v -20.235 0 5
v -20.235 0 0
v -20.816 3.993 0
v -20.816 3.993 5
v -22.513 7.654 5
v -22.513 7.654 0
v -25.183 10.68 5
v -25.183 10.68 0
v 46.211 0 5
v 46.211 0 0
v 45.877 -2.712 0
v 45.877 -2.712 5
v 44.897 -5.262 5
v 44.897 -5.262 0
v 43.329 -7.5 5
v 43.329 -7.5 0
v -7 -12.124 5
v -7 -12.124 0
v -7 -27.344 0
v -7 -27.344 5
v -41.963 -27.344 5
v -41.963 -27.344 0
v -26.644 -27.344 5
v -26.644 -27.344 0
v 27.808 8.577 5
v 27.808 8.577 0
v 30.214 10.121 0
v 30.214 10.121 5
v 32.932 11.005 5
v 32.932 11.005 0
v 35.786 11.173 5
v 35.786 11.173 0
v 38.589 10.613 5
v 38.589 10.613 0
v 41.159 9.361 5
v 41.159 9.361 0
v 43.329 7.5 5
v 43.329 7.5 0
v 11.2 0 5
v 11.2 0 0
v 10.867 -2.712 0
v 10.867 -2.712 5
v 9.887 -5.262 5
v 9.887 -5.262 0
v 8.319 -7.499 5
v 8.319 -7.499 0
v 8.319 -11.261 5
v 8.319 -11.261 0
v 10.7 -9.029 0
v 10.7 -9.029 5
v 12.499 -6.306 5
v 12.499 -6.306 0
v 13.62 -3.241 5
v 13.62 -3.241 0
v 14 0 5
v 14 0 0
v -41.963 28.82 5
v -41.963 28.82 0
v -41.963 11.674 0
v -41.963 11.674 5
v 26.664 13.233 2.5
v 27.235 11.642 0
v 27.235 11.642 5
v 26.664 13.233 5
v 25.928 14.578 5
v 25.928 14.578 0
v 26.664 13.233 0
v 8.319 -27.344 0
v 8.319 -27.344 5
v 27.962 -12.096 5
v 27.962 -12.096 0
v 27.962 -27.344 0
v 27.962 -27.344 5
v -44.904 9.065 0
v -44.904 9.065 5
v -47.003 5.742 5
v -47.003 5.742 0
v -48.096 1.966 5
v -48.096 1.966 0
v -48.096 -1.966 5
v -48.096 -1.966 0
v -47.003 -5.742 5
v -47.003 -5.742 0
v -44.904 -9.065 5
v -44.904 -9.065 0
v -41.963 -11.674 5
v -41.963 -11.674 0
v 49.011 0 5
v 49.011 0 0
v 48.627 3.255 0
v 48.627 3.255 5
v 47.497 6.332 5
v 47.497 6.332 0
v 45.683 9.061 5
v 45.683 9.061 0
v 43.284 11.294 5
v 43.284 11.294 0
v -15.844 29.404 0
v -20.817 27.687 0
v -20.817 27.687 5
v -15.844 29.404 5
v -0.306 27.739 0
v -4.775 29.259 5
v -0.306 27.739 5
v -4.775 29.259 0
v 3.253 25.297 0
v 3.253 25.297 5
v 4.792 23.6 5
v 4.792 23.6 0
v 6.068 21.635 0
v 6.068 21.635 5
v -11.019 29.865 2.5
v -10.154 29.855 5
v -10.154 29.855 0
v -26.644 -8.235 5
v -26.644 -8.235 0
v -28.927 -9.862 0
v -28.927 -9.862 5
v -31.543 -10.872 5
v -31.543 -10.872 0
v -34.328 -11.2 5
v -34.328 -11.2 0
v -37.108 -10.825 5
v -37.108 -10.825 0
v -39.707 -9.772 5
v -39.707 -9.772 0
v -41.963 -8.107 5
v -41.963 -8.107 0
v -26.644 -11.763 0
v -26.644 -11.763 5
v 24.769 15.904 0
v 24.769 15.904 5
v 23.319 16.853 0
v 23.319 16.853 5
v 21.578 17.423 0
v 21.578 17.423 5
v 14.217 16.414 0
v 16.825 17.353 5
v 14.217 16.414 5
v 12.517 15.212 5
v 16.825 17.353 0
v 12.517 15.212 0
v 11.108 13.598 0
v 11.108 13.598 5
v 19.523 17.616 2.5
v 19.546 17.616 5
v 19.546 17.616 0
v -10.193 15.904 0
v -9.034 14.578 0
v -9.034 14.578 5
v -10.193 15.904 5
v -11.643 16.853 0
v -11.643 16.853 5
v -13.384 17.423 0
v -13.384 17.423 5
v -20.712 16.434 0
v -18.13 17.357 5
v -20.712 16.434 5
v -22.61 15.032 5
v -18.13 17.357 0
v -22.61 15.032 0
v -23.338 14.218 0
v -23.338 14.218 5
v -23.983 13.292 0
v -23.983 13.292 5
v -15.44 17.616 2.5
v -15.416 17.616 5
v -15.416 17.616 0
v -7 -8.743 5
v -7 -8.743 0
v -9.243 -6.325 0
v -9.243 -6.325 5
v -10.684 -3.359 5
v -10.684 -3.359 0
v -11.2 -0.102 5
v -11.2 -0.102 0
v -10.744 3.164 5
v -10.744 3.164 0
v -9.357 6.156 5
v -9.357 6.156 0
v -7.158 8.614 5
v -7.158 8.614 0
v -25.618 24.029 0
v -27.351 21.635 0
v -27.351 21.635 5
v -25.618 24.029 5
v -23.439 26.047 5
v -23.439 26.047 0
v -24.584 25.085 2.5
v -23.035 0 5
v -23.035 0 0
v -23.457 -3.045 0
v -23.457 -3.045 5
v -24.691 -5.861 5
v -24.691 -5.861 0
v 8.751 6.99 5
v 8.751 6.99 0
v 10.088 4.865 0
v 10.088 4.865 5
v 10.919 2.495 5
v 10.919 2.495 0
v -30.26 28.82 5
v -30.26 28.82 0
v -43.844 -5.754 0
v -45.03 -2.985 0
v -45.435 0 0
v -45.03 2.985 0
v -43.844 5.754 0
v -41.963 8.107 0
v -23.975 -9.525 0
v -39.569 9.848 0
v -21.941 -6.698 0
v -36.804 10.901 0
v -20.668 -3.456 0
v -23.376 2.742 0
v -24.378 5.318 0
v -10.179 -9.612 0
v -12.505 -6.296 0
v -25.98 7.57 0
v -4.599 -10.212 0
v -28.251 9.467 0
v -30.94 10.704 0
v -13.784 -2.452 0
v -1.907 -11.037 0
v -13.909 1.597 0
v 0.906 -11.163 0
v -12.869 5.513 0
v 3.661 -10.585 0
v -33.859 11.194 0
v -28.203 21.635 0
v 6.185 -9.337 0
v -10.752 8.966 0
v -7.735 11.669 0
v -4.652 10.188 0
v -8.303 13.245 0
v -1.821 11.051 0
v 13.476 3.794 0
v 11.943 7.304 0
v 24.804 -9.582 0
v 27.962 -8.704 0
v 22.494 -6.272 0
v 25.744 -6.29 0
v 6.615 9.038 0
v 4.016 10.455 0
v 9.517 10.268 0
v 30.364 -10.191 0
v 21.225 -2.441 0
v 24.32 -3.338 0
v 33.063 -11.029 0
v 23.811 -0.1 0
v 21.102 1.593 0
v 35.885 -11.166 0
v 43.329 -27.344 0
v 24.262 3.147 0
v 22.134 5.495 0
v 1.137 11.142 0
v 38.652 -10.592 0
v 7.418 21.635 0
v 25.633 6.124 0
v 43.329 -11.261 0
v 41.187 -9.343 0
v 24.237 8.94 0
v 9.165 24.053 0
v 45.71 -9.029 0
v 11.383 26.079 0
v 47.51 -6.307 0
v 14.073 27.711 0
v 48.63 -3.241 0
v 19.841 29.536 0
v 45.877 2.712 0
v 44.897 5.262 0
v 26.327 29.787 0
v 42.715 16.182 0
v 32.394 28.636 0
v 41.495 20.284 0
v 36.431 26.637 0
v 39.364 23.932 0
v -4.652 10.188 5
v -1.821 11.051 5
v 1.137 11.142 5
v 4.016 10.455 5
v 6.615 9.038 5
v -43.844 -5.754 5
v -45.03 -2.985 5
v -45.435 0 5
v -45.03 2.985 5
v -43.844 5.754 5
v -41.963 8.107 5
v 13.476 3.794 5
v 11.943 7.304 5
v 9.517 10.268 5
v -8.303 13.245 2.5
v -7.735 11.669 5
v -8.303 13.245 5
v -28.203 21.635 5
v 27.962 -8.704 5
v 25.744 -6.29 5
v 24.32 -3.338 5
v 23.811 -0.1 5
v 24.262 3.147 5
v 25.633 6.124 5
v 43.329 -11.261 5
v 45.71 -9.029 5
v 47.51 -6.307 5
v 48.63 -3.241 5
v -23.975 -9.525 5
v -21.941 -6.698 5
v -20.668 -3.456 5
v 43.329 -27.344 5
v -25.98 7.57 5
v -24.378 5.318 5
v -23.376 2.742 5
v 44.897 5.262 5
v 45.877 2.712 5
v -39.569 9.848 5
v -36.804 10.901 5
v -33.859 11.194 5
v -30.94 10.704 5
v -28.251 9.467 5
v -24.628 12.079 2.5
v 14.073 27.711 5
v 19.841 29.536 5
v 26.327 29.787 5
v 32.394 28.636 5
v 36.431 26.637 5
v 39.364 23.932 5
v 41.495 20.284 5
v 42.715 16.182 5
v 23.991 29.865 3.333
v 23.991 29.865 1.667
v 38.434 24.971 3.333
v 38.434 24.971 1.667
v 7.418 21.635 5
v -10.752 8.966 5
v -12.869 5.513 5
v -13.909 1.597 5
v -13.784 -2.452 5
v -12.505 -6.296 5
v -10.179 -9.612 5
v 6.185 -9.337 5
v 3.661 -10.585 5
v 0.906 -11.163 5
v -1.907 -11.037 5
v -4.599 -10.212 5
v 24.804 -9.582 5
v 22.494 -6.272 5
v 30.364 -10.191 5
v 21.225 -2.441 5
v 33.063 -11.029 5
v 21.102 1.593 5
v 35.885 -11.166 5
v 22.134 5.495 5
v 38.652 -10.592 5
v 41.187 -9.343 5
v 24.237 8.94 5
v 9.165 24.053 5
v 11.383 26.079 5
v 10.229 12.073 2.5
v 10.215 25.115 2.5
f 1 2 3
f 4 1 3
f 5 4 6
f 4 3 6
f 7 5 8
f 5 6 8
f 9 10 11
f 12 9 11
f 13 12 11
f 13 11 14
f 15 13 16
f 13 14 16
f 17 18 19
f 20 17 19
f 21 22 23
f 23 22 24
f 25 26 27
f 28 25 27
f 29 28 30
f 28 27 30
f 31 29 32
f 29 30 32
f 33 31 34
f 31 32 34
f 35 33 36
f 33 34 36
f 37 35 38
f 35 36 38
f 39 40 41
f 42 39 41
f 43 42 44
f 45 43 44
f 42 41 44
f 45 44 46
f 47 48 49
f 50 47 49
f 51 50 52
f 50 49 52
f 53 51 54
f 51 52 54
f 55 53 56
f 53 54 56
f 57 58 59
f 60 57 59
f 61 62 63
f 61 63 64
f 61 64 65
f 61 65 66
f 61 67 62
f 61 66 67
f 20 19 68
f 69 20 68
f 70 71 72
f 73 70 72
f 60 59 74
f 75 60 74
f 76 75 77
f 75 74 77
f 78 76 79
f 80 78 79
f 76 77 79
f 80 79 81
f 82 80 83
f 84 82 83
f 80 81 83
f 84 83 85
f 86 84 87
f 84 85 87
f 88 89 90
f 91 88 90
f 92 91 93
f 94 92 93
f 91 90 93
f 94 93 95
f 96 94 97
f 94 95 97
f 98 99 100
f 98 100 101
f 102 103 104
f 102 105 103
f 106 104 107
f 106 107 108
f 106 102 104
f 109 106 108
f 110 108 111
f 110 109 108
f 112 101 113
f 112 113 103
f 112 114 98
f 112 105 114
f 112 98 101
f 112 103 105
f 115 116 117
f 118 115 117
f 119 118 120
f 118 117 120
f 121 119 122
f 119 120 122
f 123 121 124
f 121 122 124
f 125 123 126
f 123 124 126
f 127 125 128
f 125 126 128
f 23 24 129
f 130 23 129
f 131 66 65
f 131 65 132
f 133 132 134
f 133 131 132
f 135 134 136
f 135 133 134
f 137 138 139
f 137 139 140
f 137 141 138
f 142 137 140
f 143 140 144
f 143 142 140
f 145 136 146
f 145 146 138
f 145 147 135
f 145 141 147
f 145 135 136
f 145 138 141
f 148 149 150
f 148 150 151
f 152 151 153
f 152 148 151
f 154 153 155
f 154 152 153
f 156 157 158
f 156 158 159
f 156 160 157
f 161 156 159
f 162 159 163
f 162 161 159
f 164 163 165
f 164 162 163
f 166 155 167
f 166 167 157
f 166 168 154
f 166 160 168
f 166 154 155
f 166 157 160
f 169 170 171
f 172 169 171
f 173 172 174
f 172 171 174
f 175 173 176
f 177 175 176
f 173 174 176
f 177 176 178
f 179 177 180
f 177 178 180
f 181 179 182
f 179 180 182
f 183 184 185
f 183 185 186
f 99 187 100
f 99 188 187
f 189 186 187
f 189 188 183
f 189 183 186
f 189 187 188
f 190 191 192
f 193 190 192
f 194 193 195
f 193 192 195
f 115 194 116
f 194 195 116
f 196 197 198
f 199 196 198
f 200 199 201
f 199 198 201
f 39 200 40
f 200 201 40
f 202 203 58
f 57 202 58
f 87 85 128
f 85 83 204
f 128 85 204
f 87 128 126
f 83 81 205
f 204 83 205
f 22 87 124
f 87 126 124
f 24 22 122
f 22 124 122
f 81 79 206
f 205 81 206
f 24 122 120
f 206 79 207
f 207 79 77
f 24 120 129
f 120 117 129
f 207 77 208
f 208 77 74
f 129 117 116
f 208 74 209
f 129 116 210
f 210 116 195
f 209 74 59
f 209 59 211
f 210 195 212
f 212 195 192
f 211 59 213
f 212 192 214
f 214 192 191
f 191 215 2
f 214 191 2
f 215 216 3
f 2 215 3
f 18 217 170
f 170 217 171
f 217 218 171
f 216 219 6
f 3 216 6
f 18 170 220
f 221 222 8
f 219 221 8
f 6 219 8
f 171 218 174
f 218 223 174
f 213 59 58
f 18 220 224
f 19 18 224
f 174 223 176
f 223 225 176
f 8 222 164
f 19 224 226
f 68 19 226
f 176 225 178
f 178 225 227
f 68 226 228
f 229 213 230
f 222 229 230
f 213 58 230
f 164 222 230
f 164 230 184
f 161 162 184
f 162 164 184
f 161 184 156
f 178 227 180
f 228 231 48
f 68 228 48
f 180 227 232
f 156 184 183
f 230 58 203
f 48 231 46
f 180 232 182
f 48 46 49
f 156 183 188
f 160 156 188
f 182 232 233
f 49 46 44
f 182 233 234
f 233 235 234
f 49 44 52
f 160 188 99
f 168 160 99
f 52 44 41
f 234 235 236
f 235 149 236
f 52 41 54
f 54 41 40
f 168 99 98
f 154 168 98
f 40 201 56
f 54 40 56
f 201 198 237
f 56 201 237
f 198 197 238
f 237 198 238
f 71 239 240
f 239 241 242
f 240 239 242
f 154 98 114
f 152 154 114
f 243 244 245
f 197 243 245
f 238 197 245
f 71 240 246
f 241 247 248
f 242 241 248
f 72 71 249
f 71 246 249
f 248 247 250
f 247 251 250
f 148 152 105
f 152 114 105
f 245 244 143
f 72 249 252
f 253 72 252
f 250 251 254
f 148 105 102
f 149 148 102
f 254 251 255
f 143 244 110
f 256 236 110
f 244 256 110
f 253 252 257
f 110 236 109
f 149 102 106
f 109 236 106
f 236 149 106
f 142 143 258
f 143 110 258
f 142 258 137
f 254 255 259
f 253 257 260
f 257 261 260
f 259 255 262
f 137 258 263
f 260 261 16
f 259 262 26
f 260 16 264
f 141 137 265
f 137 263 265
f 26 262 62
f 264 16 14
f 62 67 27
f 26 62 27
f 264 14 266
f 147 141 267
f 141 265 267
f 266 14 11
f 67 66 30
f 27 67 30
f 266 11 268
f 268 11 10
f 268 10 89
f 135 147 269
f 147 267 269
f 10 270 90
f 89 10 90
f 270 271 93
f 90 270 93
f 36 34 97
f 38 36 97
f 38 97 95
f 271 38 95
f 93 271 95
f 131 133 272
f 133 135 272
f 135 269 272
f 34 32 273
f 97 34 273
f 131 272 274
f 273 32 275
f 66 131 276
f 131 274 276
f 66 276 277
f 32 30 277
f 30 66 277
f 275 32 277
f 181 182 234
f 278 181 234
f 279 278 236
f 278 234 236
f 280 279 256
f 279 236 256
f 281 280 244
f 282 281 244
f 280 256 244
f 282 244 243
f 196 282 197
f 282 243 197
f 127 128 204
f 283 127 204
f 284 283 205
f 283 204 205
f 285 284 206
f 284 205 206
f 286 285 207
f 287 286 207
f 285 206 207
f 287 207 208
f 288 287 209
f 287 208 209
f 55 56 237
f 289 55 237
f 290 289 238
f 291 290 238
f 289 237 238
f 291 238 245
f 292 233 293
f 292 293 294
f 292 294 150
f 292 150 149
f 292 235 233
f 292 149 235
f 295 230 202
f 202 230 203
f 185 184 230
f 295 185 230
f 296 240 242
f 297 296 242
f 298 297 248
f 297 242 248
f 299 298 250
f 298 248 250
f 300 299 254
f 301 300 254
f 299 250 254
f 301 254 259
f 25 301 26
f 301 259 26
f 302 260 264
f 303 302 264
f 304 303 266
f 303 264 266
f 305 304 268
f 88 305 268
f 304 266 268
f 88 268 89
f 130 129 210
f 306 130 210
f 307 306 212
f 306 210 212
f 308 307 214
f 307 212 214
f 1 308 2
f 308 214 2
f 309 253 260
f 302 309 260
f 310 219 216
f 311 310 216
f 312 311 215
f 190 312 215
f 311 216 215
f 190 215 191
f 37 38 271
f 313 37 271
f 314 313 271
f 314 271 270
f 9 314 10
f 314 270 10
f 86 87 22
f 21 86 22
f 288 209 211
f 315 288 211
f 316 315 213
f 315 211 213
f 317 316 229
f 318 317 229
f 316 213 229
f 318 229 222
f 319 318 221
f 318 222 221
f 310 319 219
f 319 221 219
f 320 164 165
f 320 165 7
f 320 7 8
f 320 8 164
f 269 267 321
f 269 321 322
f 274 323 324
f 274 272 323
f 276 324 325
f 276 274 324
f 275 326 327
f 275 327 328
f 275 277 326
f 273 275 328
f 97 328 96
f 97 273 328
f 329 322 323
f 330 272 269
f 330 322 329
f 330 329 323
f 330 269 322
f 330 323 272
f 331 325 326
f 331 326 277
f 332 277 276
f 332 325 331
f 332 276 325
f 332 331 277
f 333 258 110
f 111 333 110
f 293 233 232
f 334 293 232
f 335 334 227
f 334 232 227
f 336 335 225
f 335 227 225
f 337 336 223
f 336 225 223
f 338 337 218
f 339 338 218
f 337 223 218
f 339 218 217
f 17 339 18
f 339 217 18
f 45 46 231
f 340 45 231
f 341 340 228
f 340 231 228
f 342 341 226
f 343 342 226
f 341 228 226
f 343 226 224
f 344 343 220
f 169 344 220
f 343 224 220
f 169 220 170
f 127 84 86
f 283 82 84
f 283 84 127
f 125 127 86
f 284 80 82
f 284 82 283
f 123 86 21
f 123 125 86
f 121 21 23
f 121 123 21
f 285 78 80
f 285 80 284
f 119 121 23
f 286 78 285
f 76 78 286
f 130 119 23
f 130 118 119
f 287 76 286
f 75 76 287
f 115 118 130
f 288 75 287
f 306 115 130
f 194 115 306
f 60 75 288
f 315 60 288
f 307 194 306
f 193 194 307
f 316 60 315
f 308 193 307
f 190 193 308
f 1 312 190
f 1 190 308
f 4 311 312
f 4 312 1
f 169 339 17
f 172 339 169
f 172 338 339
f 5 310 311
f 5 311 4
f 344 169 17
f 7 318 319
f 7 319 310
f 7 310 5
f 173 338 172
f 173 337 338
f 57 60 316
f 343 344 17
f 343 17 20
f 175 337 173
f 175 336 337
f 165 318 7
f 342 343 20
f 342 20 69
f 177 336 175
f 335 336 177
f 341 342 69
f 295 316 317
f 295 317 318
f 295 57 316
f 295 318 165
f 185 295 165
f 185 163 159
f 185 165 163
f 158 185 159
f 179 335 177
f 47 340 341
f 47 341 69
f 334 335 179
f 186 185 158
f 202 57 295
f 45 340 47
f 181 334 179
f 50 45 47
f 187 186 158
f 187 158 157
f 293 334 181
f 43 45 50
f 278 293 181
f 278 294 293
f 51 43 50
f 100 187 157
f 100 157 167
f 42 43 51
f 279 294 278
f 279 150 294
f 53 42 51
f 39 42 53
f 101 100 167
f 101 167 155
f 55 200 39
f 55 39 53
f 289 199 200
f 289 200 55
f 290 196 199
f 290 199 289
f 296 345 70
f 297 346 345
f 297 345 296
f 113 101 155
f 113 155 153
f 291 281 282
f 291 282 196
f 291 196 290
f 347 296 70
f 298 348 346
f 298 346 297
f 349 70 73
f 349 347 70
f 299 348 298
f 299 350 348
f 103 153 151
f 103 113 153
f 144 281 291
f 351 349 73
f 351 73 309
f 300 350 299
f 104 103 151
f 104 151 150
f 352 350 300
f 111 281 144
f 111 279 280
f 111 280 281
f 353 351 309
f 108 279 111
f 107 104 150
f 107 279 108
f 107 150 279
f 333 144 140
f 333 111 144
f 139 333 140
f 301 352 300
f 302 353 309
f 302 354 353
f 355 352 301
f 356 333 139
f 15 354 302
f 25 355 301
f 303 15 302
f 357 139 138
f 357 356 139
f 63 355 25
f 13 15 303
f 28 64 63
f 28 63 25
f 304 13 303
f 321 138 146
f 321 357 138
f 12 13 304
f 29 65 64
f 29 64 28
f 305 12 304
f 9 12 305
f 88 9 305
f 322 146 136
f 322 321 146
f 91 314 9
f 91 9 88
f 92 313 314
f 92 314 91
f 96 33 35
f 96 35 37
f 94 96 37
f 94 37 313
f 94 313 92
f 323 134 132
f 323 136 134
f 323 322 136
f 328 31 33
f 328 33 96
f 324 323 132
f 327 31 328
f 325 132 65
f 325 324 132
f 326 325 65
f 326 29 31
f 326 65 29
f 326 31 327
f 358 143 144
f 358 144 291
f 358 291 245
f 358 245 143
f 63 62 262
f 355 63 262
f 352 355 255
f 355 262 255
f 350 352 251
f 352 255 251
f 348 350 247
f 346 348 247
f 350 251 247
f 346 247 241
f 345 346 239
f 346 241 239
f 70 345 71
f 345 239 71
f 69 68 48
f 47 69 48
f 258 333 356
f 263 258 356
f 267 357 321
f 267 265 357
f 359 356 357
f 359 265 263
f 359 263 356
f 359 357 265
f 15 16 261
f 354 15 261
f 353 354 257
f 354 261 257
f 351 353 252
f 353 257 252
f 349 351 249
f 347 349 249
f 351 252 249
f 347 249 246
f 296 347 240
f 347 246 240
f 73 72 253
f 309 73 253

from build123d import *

# Parameters (mm, degrees)
F1_DEPTH = 5


with BuildPart() as f1:
    # F0 (on Top) → F1 (new body)
    with BuildSketch(Plane.XY):
        with BuildLine():
            ThreePointArc((-7.7347107175, 11.6693723103), (1.1336247824, 13.9540279078), (9.5168901863, 10.2678528029))
            add(Edge.make_bspline(
                [(11.1075389809, 13.5977625335), (10.1467025067, 12.2132719368), (9.5168901863, 10.2678528029)],
                knots=[0, 0, 0, 0.3445166401, 0.3445166401, 0.3445166401], degree=2))
            add(Edge.make_bspline(
                [(19.5225847934, 17.6164090534), (13.8964796656, 17.6164090534), (11.1075389809, 13.5977625335)],
                knots=[0, 0, 0, 1, 1, 1], degree=2))
            add(Edge.make_bspline(
                [(25.9283073461, 14.5783122844), (23.894872207, 17.6164090534), (19.5225847934, 17.6164090534)],
                knots=[0, 0, 0, 1, 1, 1], degree=2))
            add(Edge.make_bspline(
                [(27.2352844796, 11.642238171), (26.746339163, 13.35611455), (25.9283073461, 14.5783122844)],
                knots=[0.5977094124, 0.5977094124, 0.5977094124, 1, 1, 1], degree=2))
            ThreePointArc((27.2352844796, 11.642238171), (35.3144532315, 13.9967060767), (43.2839012969, 11.2940436167))
            add(Edge.make_bspline(
                [(38.4343353159, 24.9705321847), (42.858967955, 20.5458995456), (43.2839012969, 11.2940436167)],
                knots=[0, 0, 0, 0.9039618932, 0.9039618932, 0.9039618932], degree=2))
            add(Edge.make_bspline(
                [(23.9913197235, 29.8652436459), (33.5396238547, 29.8652436459), (38.4343353159, 24.9705321847)],
                knots=[0, 0, 0, 1, 1, 1], degree=2))
            add(Edge.make_bspline(
                [(14.0733001125, 27.7112491113), (18.4616621122, 29.8652436459), (23.9913197235, 29.8652436459)],
                knots=[0, 0, 0, 1, 1, 1], degree=2))
            add(Edge.make_bspline(
                [(7.4184214756, 21.6350555733), (9.6849381128, 25.5572545766), (14.0733001125, 27.7112491113)],
                knots=[0, 0, 0, 1, 1, 1], degree=2))
            Line((7.4184214756, 21.6350555733), (6.068156245, 21.6350555733))
            add(Edge.make_bspline(
                [(-11.0191287574, 29.8652436459), (1.5833467288, 29.8652436459), (6.068156245, 21.6350555733)],
                knots=[0, 0, 0, 1, 1, 1], degree=2))
            add(Edge.make_bspline(
                [(-20.8165889728, 27.6871372321), (-16.5487863688, 29.8652436459), (-11.0191287574, 29.8652436459)],
                knots=[0, 0, 0, 1, 1, 1], degree=2))
            add(Edge.make_bspline(
                [(-27.3509082141, 21.6350555733), (-25.0843915769, 25.5090308184), (-20.8165889728, 27.6871372321)],
                knots=[0, 0, 0, 1, 1, 1], degree=2))
            Line((-27.3509082141, 21.6350555733), (-28.2028612763, 21.6350555733))
            Line((-28.2028612763, 21.6350555733), (-30.2604082945, 28.8203955507))
            Line((-30.2604082945, 28.8203955507), (-41.9627069603, 28.8203955507))
            Line((-41.9627069603, 28.8203955507), (-41.9627069603, 11.673955213))
            ThreePointArc((-41.9627069603, 11.673955213), (-33.4069158912, 13.9754934651), (-25.1827411367, 10.6798010112))
            add(Edge.make_bspline(
                [(-23.9832824305, 13.292345398), (-24.672216421, 12.172567492), (-25.1827411367, 10.6798010112)],
                knots=[0, 0, 0, 0.2589642511, 0.2589642511, 0.2589642511], degree=2))
            add(Edge.make_bspline(
                [(-15.4396399293, 17.6164090534), (-21.3229384343, 17.6164090534), (-23.9832824305, 13.292345398)],
                knots=[0, 0, 0, 1, 1, 1], degree=2))
            add(Edge.make_bspline(
                [(-9.0339173766, 14.5783122844), (-11.0673525157, 17.6164090534), (-15.4396399293, 17.6164090534)],
                knots=[0, 0, 0, 1, 1, 1], degree=2))
            add(Edge.make_bspline(
                [(-7.7347107175, 11.6693723103), (-8.2223684807, 13.3658004953), (-9.0339173766, 14.5783122844)],
                knots=[0.6008975746, 0.6008975746, 0.6008975746, 1, 1, 1], degree=2))
        make_face()
        with BuildLine():
            ThreePointArc((-7.0004822376, -8.7426110769), (-11.1995369595, -0.1018424886), (-7.1583125196, 8.6138587097))
            add(Edge.make_bspline(
                [(-7.1583125196, 8.6138587097), (-7.3408988765, 10.2994084606), (-7.7347107175, 11.6693723103)],
                knots=[0.2785992893, 0.2785992893, 0.2785992893, 0.6008975746, 0.6008975746, 0.6008975746], degree=2))
            ThreePointArc((-7.7347107175, 11.6693723103), (-13.9933390581, -0.4318124639), (-7.0004822376, -12.1240772202))
            Line((-7.0004822376, -12.1240772202), (-7.0004822376, -8.7426110769))
        make_face()
        with BuildLine():
            Line((8.3185982961, -11.2605915648), (8.3185982961, -7.4993948015))
            ThreePointArc((8.3185982961, -7.4993948015), (0.9059548348, -11.1632990571), (-7.0004822376, -8.7426110769))
            Line((-7.0004822376, -8.7426110769), (-7.0004822376, -12.1240772202))
            ThreePointArc((-7.0004822376, -12.1240772202), (0.7878828309, -13.9778124413), (8.3185982961, -11.2605915648))
        make_face()
        with BuildLine():
            Line((8.3185982961, -27.3442082107), (8.3185982961, -11.2605915648))
            ThreePointArc((8.3185982961, -11.2605915648), (0.7878828309, -13.9778124413), (-7.0004822376, -12.1240772202))
            Line((-7.0004822376, -12.1240772202), (-7.0004822376, -27.3442082107))
            Line((-7.0004822376, -27.3442082107), (8.3185982961, -27.3442082107))
        make_face()
        with BuildLine():
            ThreePointArc((8.7512339046, 6.9896999325), (10.5700950737, 3.7031189738), (11.2, 0))
            ThreePointArc((11.2, 0), (10.454862527, -4.0169452998), (8.3185982961, -7.4993948015))
            Line((8.3185982961, -7.4993948015), (8.3185982961, -11.2605915648))
            ThreePointArc((8.3185982961, -11.2605915648), (12.4992074978, -6.3063310988), (14, 0))
            ThreePointArc((14, 0), (12.8303636466, 5.6019432964), (9.5168901863, 10.2678528029))
            add(Edge.make_bspline(
                [(9.5168901863, 10.2678528029), (9.0386147828, 8.7905140923), (8.7512339046, 6.9896999325)],
                knots=[0.3445166401, 0.3445166401, 0.3445166401, 0.6061403488, 0.6061403488, 0.6061403488], degree=2))
        make_face()
        with BuildLine():
            ThreePointArc((-7.1583125196, 8.6138587097), (1.1374632162, 11.1420903529), (8.7512339046, 6.9896999325))
            add(Edge.make_bspline(
                [(9.5168901863, 10.2678528029), (9.0386147828, 8.7905140923), (8.7512339046, 6.9896999325)],
                knots=[0.3445166401, 0.3445166401, 0.3445166401, 0.6061403488, 0.6061403488, 0.6061403488], degree=2))
            ThreePointArc((9.5168901863, 10.2678528029), (1.1336247824, 13.9540279078), (-7.7347107175, 11.6693723103))
            add(Edge.make_bspline(
                [(-7.1583125196, 8.6138587097), (-7.3408988765, 10.2994084606), (-7.7347107175, 11.6693723103)],
                knots=[0.2785992893, 0.2785992893, 0.2785992893, 0.6008975746, 0.6008975746, 0.6008975746], degree=2))
        make_face()
        with BuildLine():
            add(Edge.make_bspline(
                [(-25.1827411367, 10.6798010112), (-25.659071662, 9.2870178213), (-25.9800917253, 7.5695372303)],
                knots=[0.2589642511, 0.2589642511, 0.2589642511, 0.5005834596, 0.5005834596, 0.5005834596], degree=2))
            ThreePointArc((-25.1827411367, 10.6798010112), (-33.4069158912, 13.9754934651), (-41.9627069603, 11.673955213))
            Line((-41.9627069603, 11.673955213), (-41.9627069603, 8.1068631613))
            ThreePointArc((-41.9627069603, 8.1068631613), (-33.8585902643, 11.1936758818), (-25.9800917253, 7.5695372303))
        make_face()
        with BuildLine():
            ThreePointArc((-20.2349149287, 0), (-21.5319539926, 5.8851324077), (-25.1827411367, 10.6798010112))
            add(Edge.make_bspline(
                [(-25.1827411367, 10.6798010112), (-25.659071662, 9.2870178213), (-25.9800917253, 7.5695372303)],
                knots=[0.2589642511, 0.2589642511, 0.2589642511, 0.5005834596, 0.5005834596, 0.5005834596], degree=2))
            ThreePointArc((-25.9800917253, 7.5695372303), (-23.7971464919, 4.0611562468), (-23.0349149287, 0))
            ThreePointArc((-23.0349149287, 0), (-23.9766882003, -4.495418155), (-26.6436264266, -8.2348247631))
            Line((-26.6436264266, -8.2348247631), (-26.6436264266, -11.7631772442))
            ThreePointArc((-26.6436264266, -11.7631772442), (-21.9410538788, -6.6978340145), (-20.2349149287, 0))
        make_face()
        with BuildLine():
            Line((-41.9627069603, 8.1068631613), (-41.9627069603, 11.673955213))
            ThreePointArc((-41.9627069603, 11.673955213), (-48.2349149287, 0), (-41.9627069603, -11.673955213))
            Line((-41.9627069603, -11.673955213), (-41.9627069603, -8.1068631613))
            ThreePointArc((-41.9627069603, -8.1068631613), (-45.4349149287, 0), (-41.9627069603, 8.1068631613))
        make_face()
        with BuildLine():
            ThreePointArc((-41.9627069603, -11.673955213), (-34.3164529327, -13.9997625535), (-26.6436264266, -11.7631772442))
            Line((-26.6436264266, -11.7631772442), (-26.6436264266, -8.2348247631))
            ThreePointArc((-26.6436264266, -8.2348247631), (-34.3284662316, -11.1996092858), (-41.9627069603, -8.1068631613))
            Line((-41.9627069603, -8.1068631613), (-41.9627069603, -11.673955213))
        make_face()
        with BuildLine():
            Line((-26.6436264266, -27.3442082107), (-26.6436264266, -11.7631772442))
            ThreePointArc((-26.6436264266, -11.7631772442), (-34.3164529327, -13.9997625535), (-41.9627069603, -11.673955213))
            Line((-41.9627069603, -11.673955213), (-41.9627069603, -27.3442082107))
            Line((-41.9627069603, -27.3442082107), (-26.6436264266, -27.3442082107))
        make_face()
        with BuildLine():
            Line((27.9617424851, -8.7035111635), (27.9617424851, -12.0959128045))
            ThreePointArc((27.9617424851, -12.0959128045), (35.770433872, -13.9793748811), (43.329046777, -11.2608345517))
            Line((43.329046777, -11.2608345517), (43.329046777, -7.4997596496))
            ThreePointArc((43.329046777, -7.4997596496), (35.8854164475, -11.1657962797), (27.9617424851, -8.7035111635))
        make_face()
        with BuildLine():
            ThreePointArc((43.329046777, -11.2608345517), (35.770433872, -13.9793748811), (27.9617424851, -12.0959128045))
            Line((27.9617424851, -12.0959128045), (27.9617424851, -27.3442082107))
            Line((27.9617424851, -27.3442082107), (43.329046777, -27.3442082107))
            Line((43.329046777, -27.3442082107), (43.329046777, -11.2608345517))
        make_face()
        with BuildLine():
            add(Edge.make_bspline(
                [(27.8079140171, 8.576640303), (27.6274523087, 10.2675912402), (27.2352844796, 11.642238171)],
                knots=[0.275044646, 0.275044646, 0.275044646, 0.5977094124, 0.5977094124, 0.5977094124], degree=2))
            ThreePointArc((27.2352844796, 11.642238171), (21.0173286065, -0.4282411432), (27.9617424851, -12.0959128045))
            Line((27.9617424851, -12.0959128045), (27.9617424851, -8.7035111635))
            ThreePointArc((27.9617424851, -8.7035111635), (23.8112211661, -0.0996988125), (27.8079140171, 8.576640303))
        make_face()
        with BuildLine():
            ThreePointArc((49.0107774138, 0), (47.4972447758, 6.3315189977), (43.2839012969, 11.2940436167))
            add(Edge.make_bspline(
                [(43.2839012969, 11.2940436167), (43.329046777, 10.3111142096), (43.329046777, 9.2736988782)],
                knots=[0.9039618932, 0.9039618932, 0.9039618932, 1, 1, 1], degree=2))
            Line((43.329046777, 9.2736988782), (43.329046777, 7.4997596496))
            ThreePointArc((43.329046777, 7.4997596496), (45.4655518463, 4.017174575), (46.2107774138, 0))
            ThreePointArc((46.2107774138, 0), (45.4655518463, -4.017174575), (43.329046777, -7.4997596496))
            Line((43.329046777, -7.4997596496), (43.329046777, -11.2608345517))
            ThreePointArc((43.329046777, -11.2608345517), (47.5098928042, -6.3065136532), (49.0107774138, 0))
        make_face()
        with BuildLine():
            ThreePointArc((43.2839012969, 11.2940436167), (35.3144532315, 13.9967060767), (27.2352844796, 11.642238171))
            add(Edge.make_bspline(
                [(27.8079140171, 8.576640303), (27.6274523087, 10.2675912402), (27.2352844796, 11.642238171)],
                knots=[0.275044646, 0.275044646, 0.275044646, 0.5977094124, 0.5977094124, 0.5977094124], degree=2))
            ThreePointArc((27.8079140171, 8.576640303), (35.7859874518, 11.1731396392), (43.329046777, 7.4997596496))
            Line((43.329046777, 7.4997596496), (43.329046777, 9.2736988782))
            add(Edge.make_bspline(
                [(43.2839012969, 11.2940436167), (43.329046777, 10.3111142096), (43.329046777, 9.2736988782)],
                knots=[0.9039618932, 0.9039618932, 0.9039618932, 1, 1, 1], degree=2))
        make_face()
    extrude(amount=F1_DEPTH)


solid = f1.part
